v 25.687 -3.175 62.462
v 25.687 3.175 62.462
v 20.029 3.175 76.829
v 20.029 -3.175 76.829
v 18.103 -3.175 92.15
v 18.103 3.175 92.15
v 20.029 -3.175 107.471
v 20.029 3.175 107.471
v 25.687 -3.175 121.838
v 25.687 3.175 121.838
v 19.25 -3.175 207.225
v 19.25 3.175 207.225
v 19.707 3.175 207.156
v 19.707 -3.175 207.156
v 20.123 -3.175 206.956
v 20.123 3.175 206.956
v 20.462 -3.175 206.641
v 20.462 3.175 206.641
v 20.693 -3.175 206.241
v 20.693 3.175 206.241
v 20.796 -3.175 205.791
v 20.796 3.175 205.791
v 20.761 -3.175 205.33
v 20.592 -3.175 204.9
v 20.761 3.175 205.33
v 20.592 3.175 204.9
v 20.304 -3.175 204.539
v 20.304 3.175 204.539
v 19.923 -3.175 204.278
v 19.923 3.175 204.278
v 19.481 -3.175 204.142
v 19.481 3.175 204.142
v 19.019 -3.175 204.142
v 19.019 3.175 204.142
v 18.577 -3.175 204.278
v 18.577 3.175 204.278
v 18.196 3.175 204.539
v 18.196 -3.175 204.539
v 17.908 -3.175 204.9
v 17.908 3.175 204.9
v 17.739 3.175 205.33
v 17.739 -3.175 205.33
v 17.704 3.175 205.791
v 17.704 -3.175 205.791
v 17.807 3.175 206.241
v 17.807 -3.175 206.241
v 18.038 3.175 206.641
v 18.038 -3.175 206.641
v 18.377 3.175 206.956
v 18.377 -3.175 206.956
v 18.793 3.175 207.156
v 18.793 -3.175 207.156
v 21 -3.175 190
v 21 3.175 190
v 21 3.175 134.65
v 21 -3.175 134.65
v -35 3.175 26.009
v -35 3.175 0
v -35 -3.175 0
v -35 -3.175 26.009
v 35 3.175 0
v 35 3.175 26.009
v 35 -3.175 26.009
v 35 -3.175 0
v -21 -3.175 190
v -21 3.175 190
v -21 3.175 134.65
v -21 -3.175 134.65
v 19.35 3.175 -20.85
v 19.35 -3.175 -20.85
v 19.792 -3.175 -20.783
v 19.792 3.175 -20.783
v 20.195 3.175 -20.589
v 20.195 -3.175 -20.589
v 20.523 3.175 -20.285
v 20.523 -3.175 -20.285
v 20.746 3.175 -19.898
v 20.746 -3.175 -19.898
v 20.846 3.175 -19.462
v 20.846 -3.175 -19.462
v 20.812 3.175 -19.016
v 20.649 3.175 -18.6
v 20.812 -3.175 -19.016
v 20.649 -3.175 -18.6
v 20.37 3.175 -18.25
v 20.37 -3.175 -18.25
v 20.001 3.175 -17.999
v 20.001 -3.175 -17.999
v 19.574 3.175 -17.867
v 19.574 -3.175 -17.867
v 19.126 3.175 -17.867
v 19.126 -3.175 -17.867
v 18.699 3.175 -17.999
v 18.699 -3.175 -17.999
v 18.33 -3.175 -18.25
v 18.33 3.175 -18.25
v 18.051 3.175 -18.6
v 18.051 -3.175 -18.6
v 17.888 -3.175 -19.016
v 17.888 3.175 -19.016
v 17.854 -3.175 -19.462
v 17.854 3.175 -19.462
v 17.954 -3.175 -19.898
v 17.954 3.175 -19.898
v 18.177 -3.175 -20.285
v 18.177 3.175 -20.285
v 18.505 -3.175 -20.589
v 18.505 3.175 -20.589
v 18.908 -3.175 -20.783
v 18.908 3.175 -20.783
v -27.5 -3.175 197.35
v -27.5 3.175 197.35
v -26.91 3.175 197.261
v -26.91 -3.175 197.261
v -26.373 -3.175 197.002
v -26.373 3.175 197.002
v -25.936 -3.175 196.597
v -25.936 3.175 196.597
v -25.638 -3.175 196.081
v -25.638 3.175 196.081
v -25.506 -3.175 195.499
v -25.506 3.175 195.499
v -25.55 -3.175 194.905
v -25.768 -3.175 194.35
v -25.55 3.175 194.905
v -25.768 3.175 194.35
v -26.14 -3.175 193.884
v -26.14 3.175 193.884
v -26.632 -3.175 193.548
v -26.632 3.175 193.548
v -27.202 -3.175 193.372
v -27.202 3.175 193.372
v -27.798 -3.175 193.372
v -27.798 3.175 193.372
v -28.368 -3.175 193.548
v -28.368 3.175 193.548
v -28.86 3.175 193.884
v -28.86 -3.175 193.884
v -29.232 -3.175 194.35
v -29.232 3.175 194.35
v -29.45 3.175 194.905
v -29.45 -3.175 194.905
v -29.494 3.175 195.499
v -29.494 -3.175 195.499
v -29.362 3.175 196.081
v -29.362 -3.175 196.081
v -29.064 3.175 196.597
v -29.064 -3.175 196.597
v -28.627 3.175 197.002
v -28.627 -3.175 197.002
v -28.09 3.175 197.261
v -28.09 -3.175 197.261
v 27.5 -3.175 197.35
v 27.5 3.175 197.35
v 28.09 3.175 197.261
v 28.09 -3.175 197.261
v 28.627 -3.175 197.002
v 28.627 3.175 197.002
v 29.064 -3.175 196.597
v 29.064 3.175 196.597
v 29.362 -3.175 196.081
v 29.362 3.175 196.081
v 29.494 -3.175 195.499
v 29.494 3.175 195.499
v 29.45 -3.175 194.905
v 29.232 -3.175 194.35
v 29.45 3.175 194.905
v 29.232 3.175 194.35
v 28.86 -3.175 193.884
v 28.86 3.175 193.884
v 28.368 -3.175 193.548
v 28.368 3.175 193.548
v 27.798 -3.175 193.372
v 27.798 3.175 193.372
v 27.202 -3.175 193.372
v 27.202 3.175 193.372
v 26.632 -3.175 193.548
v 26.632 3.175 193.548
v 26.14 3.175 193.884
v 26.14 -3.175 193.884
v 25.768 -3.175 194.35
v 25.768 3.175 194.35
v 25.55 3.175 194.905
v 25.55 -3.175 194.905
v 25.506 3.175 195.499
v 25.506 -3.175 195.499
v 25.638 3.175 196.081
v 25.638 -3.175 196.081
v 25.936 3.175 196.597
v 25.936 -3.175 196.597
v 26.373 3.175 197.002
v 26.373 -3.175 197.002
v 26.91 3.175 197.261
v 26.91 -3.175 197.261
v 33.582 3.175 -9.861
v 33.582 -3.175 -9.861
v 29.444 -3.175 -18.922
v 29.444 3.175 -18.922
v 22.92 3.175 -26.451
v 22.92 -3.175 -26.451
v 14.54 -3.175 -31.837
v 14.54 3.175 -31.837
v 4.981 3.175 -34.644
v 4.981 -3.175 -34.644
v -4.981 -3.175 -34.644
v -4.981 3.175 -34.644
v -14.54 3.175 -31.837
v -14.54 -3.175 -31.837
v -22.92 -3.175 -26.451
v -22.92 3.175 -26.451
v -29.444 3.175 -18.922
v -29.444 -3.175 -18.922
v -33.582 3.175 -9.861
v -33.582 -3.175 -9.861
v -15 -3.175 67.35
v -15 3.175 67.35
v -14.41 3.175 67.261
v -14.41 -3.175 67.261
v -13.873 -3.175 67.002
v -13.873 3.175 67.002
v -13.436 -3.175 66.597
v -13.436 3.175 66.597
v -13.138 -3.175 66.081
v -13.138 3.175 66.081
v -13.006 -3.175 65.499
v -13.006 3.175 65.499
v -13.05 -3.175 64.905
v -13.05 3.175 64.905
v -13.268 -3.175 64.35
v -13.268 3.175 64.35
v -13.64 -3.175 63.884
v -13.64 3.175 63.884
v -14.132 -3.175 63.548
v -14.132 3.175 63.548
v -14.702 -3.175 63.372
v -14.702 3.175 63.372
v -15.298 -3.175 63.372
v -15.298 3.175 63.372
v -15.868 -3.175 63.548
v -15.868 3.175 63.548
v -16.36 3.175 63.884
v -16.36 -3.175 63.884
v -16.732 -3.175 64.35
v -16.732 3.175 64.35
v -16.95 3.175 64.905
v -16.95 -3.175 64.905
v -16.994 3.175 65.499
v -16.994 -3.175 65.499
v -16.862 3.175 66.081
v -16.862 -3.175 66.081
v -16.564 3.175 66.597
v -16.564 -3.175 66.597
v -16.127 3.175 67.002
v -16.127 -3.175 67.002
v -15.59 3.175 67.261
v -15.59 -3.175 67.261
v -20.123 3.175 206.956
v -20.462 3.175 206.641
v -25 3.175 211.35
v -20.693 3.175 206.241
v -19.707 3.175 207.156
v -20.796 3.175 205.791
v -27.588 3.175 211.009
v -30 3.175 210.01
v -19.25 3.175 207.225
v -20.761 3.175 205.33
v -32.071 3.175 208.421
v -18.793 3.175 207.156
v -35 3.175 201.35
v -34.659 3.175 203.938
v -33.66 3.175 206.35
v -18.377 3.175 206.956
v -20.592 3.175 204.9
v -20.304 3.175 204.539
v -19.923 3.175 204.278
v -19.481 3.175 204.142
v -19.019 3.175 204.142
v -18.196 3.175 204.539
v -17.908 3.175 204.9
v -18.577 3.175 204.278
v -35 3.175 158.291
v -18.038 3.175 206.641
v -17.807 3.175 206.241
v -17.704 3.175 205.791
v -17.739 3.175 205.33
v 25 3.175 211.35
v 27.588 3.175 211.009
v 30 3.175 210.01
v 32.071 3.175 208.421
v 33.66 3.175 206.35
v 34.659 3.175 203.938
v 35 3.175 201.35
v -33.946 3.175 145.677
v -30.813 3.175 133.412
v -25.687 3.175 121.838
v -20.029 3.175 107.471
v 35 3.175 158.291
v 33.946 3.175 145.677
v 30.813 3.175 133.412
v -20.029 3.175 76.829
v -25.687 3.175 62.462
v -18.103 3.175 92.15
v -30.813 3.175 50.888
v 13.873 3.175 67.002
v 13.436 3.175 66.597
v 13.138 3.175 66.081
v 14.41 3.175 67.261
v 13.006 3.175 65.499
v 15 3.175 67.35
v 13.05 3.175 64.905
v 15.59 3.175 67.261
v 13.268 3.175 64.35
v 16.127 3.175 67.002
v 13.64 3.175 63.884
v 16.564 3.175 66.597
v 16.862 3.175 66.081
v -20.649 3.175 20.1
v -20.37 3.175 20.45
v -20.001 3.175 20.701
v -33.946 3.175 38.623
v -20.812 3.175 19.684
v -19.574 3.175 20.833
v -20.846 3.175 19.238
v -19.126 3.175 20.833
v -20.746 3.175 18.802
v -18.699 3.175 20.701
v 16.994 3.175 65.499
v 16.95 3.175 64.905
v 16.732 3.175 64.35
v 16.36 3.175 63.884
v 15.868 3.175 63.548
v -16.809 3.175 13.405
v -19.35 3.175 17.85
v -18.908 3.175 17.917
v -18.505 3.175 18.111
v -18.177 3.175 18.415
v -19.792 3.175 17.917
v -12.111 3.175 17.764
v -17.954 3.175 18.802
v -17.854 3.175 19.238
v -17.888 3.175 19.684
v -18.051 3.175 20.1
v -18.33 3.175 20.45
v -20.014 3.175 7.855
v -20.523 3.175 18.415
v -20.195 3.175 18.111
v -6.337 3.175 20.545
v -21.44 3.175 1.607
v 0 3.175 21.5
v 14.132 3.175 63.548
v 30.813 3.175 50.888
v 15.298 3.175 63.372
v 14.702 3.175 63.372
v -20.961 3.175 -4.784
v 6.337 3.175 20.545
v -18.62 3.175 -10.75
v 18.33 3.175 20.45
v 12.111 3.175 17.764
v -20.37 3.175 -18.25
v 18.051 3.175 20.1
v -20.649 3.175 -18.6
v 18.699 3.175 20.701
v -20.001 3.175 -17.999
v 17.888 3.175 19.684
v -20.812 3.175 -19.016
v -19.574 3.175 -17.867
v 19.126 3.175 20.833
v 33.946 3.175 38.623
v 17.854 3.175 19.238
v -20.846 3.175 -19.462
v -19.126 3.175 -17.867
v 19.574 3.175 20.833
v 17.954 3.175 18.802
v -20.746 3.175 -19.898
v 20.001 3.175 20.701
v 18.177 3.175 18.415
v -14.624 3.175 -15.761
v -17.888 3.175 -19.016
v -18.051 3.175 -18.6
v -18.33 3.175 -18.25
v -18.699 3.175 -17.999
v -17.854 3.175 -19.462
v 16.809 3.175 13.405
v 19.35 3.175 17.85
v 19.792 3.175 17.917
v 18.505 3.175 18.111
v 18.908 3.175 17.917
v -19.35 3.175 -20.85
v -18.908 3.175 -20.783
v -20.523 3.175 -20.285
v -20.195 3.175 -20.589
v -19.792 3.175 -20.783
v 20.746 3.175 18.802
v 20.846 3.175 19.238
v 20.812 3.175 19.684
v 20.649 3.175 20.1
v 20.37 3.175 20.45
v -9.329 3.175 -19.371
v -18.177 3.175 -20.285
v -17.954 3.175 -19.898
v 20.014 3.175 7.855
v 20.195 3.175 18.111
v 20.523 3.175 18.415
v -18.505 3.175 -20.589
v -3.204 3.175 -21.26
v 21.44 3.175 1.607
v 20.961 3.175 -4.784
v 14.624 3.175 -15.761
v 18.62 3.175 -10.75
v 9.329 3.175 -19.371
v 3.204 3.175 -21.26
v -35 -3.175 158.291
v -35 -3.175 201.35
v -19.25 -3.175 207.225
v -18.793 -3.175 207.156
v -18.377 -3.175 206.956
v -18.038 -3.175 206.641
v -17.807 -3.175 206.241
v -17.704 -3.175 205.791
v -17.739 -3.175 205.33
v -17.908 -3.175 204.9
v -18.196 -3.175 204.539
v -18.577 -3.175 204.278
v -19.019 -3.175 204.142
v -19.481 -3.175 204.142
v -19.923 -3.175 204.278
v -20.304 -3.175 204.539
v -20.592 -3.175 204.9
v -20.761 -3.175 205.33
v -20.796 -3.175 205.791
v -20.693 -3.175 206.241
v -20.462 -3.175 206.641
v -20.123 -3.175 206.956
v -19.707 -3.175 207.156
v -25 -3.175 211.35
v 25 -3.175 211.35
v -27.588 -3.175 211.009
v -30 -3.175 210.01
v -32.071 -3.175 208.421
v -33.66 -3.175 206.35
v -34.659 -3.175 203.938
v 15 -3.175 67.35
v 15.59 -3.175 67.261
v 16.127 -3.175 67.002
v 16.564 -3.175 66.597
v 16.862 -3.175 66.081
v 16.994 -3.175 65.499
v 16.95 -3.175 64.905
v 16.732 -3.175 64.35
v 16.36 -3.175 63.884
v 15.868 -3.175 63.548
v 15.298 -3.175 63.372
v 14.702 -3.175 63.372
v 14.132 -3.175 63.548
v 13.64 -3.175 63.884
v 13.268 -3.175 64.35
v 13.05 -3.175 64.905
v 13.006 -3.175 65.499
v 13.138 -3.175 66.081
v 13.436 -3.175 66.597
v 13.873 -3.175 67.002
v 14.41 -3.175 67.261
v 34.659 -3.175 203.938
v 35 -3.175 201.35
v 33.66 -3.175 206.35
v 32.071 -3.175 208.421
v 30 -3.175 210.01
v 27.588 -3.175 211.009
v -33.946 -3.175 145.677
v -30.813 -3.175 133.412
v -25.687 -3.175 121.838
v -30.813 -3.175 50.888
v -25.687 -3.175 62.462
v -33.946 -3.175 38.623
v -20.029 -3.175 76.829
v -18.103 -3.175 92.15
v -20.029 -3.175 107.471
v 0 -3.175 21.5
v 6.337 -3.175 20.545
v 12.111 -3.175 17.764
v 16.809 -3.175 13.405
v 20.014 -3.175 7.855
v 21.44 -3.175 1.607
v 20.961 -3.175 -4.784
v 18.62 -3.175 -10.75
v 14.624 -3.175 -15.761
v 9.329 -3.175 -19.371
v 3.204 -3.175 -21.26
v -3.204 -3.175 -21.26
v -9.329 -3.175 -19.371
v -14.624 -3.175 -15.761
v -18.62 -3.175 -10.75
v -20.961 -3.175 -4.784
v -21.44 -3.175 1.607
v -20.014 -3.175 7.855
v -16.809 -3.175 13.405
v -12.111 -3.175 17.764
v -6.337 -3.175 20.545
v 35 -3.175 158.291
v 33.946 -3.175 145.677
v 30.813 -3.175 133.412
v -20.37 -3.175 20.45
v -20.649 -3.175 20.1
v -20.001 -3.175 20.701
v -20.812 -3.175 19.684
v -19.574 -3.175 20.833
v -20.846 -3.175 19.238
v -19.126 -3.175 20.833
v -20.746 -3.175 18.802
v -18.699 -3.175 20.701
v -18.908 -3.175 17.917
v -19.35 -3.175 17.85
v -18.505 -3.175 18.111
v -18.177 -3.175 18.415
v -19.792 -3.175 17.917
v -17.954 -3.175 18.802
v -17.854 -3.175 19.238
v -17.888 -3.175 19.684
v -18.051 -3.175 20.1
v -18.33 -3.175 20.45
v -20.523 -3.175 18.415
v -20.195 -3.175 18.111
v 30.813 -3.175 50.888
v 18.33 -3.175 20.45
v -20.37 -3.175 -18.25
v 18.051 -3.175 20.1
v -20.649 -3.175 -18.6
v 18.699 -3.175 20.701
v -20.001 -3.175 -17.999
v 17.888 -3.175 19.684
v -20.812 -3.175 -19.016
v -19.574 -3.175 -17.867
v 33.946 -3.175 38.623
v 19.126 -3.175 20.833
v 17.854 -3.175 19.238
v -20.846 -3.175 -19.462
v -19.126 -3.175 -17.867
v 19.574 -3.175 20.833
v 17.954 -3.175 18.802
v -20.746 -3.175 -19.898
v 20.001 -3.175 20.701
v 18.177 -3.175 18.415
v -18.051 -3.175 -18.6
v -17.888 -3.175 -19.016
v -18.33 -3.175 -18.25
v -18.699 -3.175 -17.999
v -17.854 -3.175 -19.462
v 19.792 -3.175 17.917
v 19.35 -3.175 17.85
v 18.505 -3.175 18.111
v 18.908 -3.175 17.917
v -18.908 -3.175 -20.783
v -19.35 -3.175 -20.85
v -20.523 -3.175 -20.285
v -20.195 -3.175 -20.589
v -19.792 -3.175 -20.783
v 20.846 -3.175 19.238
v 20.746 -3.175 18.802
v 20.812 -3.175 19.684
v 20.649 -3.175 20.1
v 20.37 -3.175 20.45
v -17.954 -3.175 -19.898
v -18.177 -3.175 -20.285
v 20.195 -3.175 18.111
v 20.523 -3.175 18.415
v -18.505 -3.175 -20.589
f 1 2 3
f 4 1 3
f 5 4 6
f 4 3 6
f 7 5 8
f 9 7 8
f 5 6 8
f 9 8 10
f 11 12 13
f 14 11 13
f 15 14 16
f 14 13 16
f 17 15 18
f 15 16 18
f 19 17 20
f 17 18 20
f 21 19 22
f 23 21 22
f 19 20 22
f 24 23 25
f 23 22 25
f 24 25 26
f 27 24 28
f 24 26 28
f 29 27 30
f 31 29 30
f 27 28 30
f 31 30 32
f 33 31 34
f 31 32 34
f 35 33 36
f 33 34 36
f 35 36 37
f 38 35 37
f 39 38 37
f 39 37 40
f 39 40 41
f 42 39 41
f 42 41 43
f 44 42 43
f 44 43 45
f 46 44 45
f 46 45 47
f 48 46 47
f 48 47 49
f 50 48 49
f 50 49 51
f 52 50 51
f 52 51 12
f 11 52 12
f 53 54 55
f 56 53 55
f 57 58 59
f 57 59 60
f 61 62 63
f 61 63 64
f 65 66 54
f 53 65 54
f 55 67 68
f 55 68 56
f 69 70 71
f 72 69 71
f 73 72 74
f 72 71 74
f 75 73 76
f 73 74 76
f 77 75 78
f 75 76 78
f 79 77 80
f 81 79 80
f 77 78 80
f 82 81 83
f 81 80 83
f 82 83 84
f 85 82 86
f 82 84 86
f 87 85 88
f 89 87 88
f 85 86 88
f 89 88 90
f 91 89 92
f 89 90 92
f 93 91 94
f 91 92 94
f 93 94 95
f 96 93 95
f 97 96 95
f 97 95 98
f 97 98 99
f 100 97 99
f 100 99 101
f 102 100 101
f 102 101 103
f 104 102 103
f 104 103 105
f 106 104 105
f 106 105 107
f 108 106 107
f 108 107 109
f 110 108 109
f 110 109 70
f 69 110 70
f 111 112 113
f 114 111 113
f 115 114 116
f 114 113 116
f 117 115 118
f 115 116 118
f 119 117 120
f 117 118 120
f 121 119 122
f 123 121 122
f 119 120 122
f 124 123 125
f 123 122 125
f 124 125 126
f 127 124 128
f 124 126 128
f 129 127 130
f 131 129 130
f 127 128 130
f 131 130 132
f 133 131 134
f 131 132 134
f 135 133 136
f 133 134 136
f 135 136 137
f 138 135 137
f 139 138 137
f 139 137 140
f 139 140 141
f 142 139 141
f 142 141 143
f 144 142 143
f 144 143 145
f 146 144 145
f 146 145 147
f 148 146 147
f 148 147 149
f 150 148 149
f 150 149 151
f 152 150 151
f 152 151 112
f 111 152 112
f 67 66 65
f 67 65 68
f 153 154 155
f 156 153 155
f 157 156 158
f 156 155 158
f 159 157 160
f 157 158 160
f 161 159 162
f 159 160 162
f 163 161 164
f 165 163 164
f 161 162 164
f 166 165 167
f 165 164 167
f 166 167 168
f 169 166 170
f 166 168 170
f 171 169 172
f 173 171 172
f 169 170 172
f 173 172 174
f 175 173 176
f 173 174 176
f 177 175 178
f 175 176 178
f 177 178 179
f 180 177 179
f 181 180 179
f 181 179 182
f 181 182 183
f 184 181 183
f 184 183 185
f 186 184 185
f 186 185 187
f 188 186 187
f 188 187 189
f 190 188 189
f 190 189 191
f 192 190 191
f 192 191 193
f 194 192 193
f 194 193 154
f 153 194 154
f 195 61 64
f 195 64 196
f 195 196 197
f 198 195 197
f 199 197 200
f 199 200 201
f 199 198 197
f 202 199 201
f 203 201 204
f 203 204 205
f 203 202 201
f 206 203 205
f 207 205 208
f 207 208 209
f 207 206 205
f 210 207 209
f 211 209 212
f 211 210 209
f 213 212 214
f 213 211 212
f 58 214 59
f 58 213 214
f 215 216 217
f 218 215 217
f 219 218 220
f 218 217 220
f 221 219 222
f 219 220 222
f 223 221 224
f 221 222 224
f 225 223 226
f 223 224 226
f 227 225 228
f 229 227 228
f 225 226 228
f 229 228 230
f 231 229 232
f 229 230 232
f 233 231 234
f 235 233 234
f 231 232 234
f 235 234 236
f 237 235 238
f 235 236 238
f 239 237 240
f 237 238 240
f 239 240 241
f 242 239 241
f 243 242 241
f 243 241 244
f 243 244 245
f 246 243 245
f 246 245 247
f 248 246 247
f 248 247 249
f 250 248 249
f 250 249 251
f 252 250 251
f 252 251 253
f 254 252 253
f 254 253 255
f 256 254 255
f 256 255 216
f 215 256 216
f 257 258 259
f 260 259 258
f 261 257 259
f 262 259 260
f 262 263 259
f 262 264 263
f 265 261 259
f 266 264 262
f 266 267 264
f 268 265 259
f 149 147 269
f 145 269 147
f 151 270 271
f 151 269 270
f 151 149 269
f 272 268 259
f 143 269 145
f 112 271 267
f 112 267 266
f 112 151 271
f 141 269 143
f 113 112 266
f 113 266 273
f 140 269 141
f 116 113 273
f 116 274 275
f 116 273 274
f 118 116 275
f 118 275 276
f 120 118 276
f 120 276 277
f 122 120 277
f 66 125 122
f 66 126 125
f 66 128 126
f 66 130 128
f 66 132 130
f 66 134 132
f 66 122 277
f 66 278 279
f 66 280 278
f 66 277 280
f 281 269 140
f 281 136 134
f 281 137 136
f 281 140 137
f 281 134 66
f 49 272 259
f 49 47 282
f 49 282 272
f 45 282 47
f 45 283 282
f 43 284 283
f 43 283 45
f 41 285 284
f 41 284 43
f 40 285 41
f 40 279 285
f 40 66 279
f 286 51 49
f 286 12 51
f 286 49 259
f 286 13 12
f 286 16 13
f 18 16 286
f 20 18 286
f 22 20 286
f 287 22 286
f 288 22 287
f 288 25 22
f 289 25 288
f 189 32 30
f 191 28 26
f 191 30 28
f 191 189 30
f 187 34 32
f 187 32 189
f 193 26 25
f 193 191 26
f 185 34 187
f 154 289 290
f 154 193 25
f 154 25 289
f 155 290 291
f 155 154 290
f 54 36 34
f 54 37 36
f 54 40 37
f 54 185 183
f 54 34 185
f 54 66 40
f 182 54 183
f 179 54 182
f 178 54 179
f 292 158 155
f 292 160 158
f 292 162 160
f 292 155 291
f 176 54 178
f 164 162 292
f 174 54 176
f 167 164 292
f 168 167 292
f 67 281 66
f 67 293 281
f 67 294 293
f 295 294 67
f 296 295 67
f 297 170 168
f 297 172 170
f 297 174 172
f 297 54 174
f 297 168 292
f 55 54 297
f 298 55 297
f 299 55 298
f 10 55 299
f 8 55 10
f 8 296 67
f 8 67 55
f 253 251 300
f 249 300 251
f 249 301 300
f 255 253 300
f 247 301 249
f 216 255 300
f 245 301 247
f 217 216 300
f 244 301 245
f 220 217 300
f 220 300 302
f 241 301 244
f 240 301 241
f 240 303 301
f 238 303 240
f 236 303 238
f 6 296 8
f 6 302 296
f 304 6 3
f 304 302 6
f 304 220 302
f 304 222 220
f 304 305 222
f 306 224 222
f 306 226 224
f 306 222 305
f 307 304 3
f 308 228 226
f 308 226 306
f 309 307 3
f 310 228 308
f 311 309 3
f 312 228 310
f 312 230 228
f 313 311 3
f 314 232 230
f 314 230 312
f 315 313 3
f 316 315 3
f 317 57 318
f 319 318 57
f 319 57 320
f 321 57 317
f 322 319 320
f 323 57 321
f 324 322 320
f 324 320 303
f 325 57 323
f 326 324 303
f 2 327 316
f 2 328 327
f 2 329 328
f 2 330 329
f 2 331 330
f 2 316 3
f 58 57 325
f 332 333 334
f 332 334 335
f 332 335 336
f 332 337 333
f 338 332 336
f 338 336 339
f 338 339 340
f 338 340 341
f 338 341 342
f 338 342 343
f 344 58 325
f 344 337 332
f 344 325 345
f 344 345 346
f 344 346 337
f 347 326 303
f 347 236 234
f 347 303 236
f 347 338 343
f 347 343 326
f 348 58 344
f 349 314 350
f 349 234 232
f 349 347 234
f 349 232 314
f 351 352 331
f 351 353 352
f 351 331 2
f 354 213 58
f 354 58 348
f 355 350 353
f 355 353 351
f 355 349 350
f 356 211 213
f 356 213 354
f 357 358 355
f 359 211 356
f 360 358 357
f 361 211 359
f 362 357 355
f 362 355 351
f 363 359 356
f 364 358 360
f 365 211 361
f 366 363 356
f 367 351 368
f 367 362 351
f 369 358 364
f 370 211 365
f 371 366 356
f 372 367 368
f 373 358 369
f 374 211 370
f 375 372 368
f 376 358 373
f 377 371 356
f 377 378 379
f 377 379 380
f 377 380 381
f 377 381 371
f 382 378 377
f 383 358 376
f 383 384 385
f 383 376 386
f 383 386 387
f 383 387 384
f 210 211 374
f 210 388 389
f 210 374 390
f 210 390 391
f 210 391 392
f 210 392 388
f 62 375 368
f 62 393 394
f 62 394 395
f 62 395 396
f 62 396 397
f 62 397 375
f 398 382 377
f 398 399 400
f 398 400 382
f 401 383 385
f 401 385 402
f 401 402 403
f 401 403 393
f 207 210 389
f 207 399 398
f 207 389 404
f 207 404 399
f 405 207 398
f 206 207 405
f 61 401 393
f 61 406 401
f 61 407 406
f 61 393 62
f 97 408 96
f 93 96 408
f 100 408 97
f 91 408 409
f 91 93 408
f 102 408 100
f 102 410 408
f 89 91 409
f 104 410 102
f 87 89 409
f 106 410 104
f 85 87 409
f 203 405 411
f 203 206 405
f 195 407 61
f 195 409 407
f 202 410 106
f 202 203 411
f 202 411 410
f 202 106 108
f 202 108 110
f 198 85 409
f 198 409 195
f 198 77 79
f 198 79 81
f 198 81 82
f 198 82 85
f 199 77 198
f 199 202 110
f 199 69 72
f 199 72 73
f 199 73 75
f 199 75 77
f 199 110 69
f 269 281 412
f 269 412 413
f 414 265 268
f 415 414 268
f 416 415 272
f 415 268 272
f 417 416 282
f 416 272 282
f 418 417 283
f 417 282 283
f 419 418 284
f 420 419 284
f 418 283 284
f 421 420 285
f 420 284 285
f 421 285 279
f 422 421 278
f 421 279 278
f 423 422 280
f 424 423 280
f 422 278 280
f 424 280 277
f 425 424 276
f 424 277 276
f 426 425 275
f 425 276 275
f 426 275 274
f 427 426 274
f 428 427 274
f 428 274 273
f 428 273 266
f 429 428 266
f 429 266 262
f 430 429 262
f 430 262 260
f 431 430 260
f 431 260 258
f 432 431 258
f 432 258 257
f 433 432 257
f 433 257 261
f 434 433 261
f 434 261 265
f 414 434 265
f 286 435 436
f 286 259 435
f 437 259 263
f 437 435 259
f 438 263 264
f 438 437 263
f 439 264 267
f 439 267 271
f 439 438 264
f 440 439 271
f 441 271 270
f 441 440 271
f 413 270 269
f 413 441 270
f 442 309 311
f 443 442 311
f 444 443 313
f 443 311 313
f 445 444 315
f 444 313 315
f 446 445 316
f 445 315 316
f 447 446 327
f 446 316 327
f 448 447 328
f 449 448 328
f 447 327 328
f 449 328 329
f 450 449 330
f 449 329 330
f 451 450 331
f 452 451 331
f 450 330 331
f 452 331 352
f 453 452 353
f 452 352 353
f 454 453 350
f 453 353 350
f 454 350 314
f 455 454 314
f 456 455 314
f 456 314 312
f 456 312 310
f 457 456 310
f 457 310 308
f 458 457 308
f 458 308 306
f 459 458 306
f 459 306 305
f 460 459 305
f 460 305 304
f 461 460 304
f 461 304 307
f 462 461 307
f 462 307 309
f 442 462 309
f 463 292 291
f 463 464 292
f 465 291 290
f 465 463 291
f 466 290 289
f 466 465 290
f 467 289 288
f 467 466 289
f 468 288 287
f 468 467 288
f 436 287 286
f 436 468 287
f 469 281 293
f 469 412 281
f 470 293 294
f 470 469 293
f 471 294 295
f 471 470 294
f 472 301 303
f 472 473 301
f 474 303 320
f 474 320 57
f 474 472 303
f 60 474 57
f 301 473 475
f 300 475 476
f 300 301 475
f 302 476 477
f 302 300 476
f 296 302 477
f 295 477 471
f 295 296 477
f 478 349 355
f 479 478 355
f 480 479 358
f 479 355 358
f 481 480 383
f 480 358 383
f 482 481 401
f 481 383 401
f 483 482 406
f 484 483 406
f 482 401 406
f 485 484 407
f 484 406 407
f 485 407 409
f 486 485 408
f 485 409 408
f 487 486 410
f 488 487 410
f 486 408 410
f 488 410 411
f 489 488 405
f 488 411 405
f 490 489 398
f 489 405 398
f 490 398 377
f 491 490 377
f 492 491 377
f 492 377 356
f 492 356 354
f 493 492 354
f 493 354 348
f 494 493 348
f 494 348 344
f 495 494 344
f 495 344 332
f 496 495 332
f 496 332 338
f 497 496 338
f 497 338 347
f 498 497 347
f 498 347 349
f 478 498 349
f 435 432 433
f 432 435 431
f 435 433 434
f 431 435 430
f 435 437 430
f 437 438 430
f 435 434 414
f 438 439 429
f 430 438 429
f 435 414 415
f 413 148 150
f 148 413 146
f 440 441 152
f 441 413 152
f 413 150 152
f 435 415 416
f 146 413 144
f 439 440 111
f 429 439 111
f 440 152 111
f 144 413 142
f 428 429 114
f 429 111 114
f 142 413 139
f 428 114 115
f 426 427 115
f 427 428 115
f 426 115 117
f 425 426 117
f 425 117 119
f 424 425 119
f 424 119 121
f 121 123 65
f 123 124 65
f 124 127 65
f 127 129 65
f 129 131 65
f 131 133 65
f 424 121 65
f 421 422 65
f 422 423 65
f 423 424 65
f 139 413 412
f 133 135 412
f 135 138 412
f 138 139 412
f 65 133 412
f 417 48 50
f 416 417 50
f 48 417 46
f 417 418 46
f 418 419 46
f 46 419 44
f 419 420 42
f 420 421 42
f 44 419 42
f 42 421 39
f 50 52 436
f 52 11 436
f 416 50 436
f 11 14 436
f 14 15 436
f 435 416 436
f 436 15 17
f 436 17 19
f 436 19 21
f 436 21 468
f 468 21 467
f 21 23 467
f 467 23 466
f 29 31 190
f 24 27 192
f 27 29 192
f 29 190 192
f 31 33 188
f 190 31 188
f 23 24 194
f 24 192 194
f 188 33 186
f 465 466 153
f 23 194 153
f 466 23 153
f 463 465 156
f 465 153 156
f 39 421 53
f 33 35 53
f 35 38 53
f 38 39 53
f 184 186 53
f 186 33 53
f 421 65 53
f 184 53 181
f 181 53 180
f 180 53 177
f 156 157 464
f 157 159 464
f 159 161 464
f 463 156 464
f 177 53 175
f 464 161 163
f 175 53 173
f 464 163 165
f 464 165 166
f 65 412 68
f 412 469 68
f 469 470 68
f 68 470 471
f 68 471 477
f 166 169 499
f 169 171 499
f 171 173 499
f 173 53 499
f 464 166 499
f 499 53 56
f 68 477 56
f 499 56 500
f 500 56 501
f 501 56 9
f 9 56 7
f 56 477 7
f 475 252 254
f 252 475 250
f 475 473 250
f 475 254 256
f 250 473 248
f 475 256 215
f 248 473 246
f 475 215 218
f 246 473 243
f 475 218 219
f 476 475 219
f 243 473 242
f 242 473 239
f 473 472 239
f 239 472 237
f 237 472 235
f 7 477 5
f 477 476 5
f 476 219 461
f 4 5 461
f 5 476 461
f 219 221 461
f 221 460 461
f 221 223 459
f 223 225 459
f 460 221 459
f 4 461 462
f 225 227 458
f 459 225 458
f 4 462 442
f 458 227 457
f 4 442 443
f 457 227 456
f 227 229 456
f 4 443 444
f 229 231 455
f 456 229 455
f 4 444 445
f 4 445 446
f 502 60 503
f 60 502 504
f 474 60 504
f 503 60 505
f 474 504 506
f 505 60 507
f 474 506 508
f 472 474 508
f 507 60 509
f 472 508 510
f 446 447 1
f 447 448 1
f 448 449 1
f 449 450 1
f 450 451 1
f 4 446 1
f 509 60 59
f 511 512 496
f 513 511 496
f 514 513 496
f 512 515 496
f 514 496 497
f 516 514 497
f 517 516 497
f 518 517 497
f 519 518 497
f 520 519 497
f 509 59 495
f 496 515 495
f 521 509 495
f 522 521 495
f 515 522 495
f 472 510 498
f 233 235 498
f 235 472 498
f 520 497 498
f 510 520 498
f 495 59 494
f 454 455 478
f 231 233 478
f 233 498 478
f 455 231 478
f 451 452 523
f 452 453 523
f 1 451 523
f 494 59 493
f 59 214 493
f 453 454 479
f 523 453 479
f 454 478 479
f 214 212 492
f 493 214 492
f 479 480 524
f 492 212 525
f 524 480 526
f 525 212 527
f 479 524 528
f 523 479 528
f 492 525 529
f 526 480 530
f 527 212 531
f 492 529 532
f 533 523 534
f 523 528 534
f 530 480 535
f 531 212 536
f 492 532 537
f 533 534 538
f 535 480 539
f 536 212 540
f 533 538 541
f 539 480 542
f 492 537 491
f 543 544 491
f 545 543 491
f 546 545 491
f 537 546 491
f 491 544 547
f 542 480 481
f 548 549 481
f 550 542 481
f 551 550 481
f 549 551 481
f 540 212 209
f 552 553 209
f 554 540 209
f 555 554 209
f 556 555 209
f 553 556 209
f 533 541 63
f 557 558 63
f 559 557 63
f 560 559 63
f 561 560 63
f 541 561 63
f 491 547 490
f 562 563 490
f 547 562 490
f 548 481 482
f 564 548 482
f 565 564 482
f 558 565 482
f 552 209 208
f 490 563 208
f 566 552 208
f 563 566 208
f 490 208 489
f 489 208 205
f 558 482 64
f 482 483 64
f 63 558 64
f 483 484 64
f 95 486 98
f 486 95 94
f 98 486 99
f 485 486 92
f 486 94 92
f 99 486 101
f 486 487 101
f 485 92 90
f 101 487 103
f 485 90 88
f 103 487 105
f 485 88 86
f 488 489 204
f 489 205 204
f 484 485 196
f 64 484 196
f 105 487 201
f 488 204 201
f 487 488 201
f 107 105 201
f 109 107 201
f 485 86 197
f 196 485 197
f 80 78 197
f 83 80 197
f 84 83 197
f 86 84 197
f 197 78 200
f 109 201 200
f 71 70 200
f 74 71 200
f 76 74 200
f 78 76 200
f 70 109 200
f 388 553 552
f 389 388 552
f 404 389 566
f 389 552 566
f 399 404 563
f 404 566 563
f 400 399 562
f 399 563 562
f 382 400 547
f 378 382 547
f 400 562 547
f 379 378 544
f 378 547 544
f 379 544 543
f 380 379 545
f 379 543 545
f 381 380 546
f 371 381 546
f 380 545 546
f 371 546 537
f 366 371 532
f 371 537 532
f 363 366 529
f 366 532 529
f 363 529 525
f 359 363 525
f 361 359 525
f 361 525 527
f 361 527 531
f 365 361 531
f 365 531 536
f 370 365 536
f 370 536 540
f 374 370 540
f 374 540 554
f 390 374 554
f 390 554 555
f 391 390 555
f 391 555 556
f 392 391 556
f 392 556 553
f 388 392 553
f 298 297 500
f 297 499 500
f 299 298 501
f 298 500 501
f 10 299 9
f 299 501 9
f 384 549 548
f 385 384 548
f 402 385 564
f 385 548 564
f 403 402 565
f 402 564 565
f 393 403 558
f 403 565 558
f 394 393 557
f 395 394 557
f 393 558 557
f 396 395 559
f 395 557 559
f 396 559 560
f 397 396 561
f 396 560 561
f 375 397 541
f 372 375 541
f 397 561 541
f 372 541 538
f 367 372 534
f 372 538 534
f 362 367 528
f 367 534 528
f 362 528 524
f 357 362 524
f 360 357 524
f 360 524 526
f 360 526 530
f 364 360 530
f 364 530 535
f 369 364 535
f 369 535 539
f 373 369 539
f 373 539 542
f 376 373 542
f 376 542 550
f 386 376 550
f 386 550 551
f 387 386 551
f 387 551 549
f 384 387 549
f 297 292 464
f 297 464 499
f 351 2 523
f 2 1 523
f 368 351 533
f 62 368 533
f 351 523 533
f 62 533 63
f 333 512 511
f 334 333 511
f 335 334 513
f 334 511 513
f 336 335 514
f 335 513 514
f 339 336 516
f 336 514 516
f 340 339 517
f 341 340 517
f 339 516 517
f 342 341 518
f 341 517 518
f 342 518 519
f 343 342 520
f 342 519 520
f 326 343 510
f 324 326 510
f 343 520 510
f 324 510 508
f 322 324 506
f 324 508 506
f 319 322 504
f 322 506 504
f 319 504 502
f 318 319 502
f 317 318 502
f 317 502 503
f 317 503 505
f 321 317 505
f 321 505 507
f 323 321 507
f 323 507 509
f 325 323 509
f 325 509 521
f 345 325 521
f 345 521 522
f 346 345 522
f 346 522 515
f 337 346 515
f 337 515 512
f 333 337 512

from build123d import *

# Parameters (mm, degrees)
BOSS_EXTRUDE1_DEPTH = 3.175
SKETCH2_R           = 21.5
CUT_EXTRUDE1_DEPTH  = 215.322525648
SKETCH3_W           = 42
SKETCH3_H           = 55.35
CUT_EXTRUDE2_DEPTH  = 215.322525648
SKETCH4_R           = 1.5
CUT_EXTRUDE3_DEPTH  = 215.322525648
FILLET1_R           = 10
SKETCH5_R           = 2
CUT_EXTRUDE4_DEPTH  = 215.322525648
CUT_EXTRUDE5_DEPTH  = 215.322525648
FILLET2_R           = 76
SKETCH7_R           = 1.55
CUT_EXTRUDE6_DEPTH  = 10


with BuildPart() as part:
    # Sketch1 → Boss-Extrude1 (new, symmetric)
    with BuildSketch(Plane(origin=(0, 0, 0), x_dir=(1, 0, 0), z_dir=(0, 1, 0))):
        with BuildLine():
            Line((35, -211.35), (35, 0))
            ThreePointArc((35, 0), (0, 35), (-35, 0))
            Line((-35, 0), (-35, -211.35))
            Line((-35, -211.35), (35, -211.35))
        make_face()
    extrude(amount=BOSS_EXTRUDE1_DEPTH, both=True)

    # Sketch2 → Cut-Extrude1 (cut, through all)
    with BuildSketch(Plane(origin=(0, 3.175, 0), x_dir=(1, 0, 0), z_dir=(0, 1, 0))):
        with Locations(Location((0, 0, 0), (0, 0, 270))):
            Circle(SKETCH2_R)
    extrude(amount=-CUT_EXTRUDE1_DEPTH, mode=Mode.SUBTRACT)

    # Sketch3 → Cut-Extrude2 (cut, through all)
    with BuildSketch(Plane(origin=(0, 3.175, 0), x_dir=(1, 0, 0), z_dir=(0, 1, 0))):
        with Locations((0, -162.325)):
            Rectangle(SKETCH3_W, SKETCH3_H)
    extrude(amount=-CUT_EXTRUDE2_DEPTH, mode=Mode.SUBTRACT)

    # Sketch4 → Cut-Extrude3 (cut, through all)
    with BuildSketch(Plane.XZ.offset(3.175)):
        with Locations(Location((-19.35, 19.35, 0), (0, 0, 270))):
            Circle(SKETCH4_R)
        with Locations(Location((19.35, 19.35, 0), (0, 0, 270))):
            Circle(SKETCH4_R)
        with Locations(Location((19.35, -19.35, 0), (0, 0, 270))):
            Circle(SKETCH4_R)
        with Locations(Location((-19.35, -19.35, 0), (0, 0, 270))):
            Circle(SKETCH4_R)
    extrude(amount=-CUT_EXTRUDE3_DEPTH, mode=Mode.SUBTRACT)

    # Fillet1
    fillet1_edges = [part.edges().sort_by_distance(p)[0] for p in [
        (35, 0, 211.35),
        (-35, 0, 211.35),
    ]]
    fillet(fillet1_edges, radius=FILLET1_R)

    # Sketch5 → Cut-Extrude4 (cut, through all)
    with BuildSketch(Plane(origin=(0, 3.175, 0), x_dir=(1, 0, 0), z_dir=(0, 1, 0))):
        with Locations(Location((15, -65.35, 0), (0, 0, 270))):
            Circle(SKETCH5_R)
        with Locations(Location((-15, -65.35, 0), (0, 0, 270))):
            Circle(SKETCH5_R)
        with Locations(Location((27.5, -195.35, 0), (0, 0, 270))):
            Circle(SKETCH5_R)
        with Locations(Location((-27.5, -195.35, 0), (0, 0, 270))):
            Circle(SKETCH5_R)
    extrude(amount=-CUT_EXTRUDE4_DEPTH, mode=Mode.SUBTRACT)

    # Sketch6 → Cut-Extrude5 (cut, through all)
    with BuildSketch(Plane(origin=(0, 3.175, 0), x_dir=(1, 0, 0), z_dir=(0, 1, 0))):
        with BuildLine():
            Line((-35, -134.65), (-35, -49.65))
            ThreePointArc((-35, -49.65), (-18.102907984, -92.15), (-35, -134.65))
        make_face()
    cut_extrude5 = extrude(amount=-CUT_EXTRUDE5_DEPTH, mode=Mode.SUBTRACT)

    # Mirror1: Cut-Extrude5 across plane
    add(cut_extrude5.mirror(Plane(origin=(0, 0, 0), x_dir=(0, 0, 1), z_dir=(1, 0, 0))), mode=Mode.SUBTRACT)

    # Fillet2
    fillet2_edges = [part.edges().sort_by_distance(p)[0] for p in [
        (35, 0, 134.65),
        (35, 0, 49.65),
        (-35, 0, 49.65),
        (-35, 0, 134.65),
    ]]
    fillet(fillet2_edges, radius=FILLET2_R)

    # Sketch7 → Cut-Extrude6 (cut)
    with BuildSketch(Plane(origin=(0, 3.175, 0), x_dir=(1, 0, 0), z_dir=(0, 1, 0))):
        with Locations(Location((-19.25, -205.675, 0), (0, 0, 270))):
            Circle(SKETCH7_R)
        with Locations(Location((19.25, -205.675, 0), (0, 0, 270))):
            Circle(SKETCH7_R)
    extrude(amount=-CUT_EXTRUDE6_DEPTH, mode=Mode.SUBTRACT)


solid = part.part
